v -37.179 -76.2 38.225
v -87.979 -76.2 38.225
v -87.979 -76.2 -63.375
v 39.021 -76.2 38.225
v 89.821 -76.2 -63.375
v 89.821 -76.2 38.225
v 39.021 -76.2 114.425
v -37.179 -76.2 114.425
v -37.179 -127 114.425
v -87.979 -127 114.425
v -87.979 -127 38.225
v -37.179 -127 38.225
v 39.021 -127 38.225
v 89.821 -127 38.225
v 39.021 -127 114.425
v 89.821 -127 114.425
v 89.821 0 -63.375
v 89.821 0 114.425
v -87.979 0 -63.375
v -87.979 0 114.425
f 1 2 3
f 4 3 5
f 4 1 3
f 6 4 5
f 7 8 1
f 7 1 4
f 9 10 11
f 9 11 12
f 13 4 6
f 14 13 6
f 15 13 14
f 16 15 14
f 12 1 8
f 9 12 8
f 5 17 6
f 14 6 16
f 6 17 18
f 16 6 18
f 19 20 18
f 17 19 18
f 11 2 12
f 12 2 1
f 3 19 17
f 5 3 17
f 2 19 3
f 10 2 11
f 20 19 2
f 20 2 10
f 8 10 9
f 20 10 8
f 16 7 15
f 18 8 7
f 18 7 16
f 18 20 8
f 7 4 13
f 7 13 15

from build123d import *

# Parameters (mm, degrees)
F0_W     = 177.8
F0_H     = 177.8
F1_DEPTH = 50.8
F2_DEPTH = 25.4
F3_W     = 50.8
F3_H     = 76.2
F4_DEPTH = 50.8


# Not quite as in the source:
# - a feature names something its author has since deleted; it is built from what else it names


with BuildPart() as f1:
    # F0 (on Front) → F1 (new body)
    with BuildSketch(Plane.XZ):
        with Locations((0.9207129478, 25.5247855931)):
            Rectangle(F0_W, F0_H)
    extrude(amount=F1_DEPTH)

    # F2 (add, symmetric): a face of the model
    f2_faces = [f1.faces().sort_by_distance(p)[0] for p in [
        (0.9207129478, -50.8, 25.5247855931),
    ]]
    extrude(f2_faces, amount=F2_DEPTH, both=True)

    # F3 (on face) → F4 (join)
    with BuildSketch(Plane.XZ.offset(76.2)):
        with Locations((-62.5792870522, 76.3247855931)):
            Rectangle(F3_W, F3_H)
        with Locations((64.4207129478, 76.3247855931)):
            Rectangle(F3_W, F3_H)
    extrude(amount=F4_DEPTH)


solid = f1.part
